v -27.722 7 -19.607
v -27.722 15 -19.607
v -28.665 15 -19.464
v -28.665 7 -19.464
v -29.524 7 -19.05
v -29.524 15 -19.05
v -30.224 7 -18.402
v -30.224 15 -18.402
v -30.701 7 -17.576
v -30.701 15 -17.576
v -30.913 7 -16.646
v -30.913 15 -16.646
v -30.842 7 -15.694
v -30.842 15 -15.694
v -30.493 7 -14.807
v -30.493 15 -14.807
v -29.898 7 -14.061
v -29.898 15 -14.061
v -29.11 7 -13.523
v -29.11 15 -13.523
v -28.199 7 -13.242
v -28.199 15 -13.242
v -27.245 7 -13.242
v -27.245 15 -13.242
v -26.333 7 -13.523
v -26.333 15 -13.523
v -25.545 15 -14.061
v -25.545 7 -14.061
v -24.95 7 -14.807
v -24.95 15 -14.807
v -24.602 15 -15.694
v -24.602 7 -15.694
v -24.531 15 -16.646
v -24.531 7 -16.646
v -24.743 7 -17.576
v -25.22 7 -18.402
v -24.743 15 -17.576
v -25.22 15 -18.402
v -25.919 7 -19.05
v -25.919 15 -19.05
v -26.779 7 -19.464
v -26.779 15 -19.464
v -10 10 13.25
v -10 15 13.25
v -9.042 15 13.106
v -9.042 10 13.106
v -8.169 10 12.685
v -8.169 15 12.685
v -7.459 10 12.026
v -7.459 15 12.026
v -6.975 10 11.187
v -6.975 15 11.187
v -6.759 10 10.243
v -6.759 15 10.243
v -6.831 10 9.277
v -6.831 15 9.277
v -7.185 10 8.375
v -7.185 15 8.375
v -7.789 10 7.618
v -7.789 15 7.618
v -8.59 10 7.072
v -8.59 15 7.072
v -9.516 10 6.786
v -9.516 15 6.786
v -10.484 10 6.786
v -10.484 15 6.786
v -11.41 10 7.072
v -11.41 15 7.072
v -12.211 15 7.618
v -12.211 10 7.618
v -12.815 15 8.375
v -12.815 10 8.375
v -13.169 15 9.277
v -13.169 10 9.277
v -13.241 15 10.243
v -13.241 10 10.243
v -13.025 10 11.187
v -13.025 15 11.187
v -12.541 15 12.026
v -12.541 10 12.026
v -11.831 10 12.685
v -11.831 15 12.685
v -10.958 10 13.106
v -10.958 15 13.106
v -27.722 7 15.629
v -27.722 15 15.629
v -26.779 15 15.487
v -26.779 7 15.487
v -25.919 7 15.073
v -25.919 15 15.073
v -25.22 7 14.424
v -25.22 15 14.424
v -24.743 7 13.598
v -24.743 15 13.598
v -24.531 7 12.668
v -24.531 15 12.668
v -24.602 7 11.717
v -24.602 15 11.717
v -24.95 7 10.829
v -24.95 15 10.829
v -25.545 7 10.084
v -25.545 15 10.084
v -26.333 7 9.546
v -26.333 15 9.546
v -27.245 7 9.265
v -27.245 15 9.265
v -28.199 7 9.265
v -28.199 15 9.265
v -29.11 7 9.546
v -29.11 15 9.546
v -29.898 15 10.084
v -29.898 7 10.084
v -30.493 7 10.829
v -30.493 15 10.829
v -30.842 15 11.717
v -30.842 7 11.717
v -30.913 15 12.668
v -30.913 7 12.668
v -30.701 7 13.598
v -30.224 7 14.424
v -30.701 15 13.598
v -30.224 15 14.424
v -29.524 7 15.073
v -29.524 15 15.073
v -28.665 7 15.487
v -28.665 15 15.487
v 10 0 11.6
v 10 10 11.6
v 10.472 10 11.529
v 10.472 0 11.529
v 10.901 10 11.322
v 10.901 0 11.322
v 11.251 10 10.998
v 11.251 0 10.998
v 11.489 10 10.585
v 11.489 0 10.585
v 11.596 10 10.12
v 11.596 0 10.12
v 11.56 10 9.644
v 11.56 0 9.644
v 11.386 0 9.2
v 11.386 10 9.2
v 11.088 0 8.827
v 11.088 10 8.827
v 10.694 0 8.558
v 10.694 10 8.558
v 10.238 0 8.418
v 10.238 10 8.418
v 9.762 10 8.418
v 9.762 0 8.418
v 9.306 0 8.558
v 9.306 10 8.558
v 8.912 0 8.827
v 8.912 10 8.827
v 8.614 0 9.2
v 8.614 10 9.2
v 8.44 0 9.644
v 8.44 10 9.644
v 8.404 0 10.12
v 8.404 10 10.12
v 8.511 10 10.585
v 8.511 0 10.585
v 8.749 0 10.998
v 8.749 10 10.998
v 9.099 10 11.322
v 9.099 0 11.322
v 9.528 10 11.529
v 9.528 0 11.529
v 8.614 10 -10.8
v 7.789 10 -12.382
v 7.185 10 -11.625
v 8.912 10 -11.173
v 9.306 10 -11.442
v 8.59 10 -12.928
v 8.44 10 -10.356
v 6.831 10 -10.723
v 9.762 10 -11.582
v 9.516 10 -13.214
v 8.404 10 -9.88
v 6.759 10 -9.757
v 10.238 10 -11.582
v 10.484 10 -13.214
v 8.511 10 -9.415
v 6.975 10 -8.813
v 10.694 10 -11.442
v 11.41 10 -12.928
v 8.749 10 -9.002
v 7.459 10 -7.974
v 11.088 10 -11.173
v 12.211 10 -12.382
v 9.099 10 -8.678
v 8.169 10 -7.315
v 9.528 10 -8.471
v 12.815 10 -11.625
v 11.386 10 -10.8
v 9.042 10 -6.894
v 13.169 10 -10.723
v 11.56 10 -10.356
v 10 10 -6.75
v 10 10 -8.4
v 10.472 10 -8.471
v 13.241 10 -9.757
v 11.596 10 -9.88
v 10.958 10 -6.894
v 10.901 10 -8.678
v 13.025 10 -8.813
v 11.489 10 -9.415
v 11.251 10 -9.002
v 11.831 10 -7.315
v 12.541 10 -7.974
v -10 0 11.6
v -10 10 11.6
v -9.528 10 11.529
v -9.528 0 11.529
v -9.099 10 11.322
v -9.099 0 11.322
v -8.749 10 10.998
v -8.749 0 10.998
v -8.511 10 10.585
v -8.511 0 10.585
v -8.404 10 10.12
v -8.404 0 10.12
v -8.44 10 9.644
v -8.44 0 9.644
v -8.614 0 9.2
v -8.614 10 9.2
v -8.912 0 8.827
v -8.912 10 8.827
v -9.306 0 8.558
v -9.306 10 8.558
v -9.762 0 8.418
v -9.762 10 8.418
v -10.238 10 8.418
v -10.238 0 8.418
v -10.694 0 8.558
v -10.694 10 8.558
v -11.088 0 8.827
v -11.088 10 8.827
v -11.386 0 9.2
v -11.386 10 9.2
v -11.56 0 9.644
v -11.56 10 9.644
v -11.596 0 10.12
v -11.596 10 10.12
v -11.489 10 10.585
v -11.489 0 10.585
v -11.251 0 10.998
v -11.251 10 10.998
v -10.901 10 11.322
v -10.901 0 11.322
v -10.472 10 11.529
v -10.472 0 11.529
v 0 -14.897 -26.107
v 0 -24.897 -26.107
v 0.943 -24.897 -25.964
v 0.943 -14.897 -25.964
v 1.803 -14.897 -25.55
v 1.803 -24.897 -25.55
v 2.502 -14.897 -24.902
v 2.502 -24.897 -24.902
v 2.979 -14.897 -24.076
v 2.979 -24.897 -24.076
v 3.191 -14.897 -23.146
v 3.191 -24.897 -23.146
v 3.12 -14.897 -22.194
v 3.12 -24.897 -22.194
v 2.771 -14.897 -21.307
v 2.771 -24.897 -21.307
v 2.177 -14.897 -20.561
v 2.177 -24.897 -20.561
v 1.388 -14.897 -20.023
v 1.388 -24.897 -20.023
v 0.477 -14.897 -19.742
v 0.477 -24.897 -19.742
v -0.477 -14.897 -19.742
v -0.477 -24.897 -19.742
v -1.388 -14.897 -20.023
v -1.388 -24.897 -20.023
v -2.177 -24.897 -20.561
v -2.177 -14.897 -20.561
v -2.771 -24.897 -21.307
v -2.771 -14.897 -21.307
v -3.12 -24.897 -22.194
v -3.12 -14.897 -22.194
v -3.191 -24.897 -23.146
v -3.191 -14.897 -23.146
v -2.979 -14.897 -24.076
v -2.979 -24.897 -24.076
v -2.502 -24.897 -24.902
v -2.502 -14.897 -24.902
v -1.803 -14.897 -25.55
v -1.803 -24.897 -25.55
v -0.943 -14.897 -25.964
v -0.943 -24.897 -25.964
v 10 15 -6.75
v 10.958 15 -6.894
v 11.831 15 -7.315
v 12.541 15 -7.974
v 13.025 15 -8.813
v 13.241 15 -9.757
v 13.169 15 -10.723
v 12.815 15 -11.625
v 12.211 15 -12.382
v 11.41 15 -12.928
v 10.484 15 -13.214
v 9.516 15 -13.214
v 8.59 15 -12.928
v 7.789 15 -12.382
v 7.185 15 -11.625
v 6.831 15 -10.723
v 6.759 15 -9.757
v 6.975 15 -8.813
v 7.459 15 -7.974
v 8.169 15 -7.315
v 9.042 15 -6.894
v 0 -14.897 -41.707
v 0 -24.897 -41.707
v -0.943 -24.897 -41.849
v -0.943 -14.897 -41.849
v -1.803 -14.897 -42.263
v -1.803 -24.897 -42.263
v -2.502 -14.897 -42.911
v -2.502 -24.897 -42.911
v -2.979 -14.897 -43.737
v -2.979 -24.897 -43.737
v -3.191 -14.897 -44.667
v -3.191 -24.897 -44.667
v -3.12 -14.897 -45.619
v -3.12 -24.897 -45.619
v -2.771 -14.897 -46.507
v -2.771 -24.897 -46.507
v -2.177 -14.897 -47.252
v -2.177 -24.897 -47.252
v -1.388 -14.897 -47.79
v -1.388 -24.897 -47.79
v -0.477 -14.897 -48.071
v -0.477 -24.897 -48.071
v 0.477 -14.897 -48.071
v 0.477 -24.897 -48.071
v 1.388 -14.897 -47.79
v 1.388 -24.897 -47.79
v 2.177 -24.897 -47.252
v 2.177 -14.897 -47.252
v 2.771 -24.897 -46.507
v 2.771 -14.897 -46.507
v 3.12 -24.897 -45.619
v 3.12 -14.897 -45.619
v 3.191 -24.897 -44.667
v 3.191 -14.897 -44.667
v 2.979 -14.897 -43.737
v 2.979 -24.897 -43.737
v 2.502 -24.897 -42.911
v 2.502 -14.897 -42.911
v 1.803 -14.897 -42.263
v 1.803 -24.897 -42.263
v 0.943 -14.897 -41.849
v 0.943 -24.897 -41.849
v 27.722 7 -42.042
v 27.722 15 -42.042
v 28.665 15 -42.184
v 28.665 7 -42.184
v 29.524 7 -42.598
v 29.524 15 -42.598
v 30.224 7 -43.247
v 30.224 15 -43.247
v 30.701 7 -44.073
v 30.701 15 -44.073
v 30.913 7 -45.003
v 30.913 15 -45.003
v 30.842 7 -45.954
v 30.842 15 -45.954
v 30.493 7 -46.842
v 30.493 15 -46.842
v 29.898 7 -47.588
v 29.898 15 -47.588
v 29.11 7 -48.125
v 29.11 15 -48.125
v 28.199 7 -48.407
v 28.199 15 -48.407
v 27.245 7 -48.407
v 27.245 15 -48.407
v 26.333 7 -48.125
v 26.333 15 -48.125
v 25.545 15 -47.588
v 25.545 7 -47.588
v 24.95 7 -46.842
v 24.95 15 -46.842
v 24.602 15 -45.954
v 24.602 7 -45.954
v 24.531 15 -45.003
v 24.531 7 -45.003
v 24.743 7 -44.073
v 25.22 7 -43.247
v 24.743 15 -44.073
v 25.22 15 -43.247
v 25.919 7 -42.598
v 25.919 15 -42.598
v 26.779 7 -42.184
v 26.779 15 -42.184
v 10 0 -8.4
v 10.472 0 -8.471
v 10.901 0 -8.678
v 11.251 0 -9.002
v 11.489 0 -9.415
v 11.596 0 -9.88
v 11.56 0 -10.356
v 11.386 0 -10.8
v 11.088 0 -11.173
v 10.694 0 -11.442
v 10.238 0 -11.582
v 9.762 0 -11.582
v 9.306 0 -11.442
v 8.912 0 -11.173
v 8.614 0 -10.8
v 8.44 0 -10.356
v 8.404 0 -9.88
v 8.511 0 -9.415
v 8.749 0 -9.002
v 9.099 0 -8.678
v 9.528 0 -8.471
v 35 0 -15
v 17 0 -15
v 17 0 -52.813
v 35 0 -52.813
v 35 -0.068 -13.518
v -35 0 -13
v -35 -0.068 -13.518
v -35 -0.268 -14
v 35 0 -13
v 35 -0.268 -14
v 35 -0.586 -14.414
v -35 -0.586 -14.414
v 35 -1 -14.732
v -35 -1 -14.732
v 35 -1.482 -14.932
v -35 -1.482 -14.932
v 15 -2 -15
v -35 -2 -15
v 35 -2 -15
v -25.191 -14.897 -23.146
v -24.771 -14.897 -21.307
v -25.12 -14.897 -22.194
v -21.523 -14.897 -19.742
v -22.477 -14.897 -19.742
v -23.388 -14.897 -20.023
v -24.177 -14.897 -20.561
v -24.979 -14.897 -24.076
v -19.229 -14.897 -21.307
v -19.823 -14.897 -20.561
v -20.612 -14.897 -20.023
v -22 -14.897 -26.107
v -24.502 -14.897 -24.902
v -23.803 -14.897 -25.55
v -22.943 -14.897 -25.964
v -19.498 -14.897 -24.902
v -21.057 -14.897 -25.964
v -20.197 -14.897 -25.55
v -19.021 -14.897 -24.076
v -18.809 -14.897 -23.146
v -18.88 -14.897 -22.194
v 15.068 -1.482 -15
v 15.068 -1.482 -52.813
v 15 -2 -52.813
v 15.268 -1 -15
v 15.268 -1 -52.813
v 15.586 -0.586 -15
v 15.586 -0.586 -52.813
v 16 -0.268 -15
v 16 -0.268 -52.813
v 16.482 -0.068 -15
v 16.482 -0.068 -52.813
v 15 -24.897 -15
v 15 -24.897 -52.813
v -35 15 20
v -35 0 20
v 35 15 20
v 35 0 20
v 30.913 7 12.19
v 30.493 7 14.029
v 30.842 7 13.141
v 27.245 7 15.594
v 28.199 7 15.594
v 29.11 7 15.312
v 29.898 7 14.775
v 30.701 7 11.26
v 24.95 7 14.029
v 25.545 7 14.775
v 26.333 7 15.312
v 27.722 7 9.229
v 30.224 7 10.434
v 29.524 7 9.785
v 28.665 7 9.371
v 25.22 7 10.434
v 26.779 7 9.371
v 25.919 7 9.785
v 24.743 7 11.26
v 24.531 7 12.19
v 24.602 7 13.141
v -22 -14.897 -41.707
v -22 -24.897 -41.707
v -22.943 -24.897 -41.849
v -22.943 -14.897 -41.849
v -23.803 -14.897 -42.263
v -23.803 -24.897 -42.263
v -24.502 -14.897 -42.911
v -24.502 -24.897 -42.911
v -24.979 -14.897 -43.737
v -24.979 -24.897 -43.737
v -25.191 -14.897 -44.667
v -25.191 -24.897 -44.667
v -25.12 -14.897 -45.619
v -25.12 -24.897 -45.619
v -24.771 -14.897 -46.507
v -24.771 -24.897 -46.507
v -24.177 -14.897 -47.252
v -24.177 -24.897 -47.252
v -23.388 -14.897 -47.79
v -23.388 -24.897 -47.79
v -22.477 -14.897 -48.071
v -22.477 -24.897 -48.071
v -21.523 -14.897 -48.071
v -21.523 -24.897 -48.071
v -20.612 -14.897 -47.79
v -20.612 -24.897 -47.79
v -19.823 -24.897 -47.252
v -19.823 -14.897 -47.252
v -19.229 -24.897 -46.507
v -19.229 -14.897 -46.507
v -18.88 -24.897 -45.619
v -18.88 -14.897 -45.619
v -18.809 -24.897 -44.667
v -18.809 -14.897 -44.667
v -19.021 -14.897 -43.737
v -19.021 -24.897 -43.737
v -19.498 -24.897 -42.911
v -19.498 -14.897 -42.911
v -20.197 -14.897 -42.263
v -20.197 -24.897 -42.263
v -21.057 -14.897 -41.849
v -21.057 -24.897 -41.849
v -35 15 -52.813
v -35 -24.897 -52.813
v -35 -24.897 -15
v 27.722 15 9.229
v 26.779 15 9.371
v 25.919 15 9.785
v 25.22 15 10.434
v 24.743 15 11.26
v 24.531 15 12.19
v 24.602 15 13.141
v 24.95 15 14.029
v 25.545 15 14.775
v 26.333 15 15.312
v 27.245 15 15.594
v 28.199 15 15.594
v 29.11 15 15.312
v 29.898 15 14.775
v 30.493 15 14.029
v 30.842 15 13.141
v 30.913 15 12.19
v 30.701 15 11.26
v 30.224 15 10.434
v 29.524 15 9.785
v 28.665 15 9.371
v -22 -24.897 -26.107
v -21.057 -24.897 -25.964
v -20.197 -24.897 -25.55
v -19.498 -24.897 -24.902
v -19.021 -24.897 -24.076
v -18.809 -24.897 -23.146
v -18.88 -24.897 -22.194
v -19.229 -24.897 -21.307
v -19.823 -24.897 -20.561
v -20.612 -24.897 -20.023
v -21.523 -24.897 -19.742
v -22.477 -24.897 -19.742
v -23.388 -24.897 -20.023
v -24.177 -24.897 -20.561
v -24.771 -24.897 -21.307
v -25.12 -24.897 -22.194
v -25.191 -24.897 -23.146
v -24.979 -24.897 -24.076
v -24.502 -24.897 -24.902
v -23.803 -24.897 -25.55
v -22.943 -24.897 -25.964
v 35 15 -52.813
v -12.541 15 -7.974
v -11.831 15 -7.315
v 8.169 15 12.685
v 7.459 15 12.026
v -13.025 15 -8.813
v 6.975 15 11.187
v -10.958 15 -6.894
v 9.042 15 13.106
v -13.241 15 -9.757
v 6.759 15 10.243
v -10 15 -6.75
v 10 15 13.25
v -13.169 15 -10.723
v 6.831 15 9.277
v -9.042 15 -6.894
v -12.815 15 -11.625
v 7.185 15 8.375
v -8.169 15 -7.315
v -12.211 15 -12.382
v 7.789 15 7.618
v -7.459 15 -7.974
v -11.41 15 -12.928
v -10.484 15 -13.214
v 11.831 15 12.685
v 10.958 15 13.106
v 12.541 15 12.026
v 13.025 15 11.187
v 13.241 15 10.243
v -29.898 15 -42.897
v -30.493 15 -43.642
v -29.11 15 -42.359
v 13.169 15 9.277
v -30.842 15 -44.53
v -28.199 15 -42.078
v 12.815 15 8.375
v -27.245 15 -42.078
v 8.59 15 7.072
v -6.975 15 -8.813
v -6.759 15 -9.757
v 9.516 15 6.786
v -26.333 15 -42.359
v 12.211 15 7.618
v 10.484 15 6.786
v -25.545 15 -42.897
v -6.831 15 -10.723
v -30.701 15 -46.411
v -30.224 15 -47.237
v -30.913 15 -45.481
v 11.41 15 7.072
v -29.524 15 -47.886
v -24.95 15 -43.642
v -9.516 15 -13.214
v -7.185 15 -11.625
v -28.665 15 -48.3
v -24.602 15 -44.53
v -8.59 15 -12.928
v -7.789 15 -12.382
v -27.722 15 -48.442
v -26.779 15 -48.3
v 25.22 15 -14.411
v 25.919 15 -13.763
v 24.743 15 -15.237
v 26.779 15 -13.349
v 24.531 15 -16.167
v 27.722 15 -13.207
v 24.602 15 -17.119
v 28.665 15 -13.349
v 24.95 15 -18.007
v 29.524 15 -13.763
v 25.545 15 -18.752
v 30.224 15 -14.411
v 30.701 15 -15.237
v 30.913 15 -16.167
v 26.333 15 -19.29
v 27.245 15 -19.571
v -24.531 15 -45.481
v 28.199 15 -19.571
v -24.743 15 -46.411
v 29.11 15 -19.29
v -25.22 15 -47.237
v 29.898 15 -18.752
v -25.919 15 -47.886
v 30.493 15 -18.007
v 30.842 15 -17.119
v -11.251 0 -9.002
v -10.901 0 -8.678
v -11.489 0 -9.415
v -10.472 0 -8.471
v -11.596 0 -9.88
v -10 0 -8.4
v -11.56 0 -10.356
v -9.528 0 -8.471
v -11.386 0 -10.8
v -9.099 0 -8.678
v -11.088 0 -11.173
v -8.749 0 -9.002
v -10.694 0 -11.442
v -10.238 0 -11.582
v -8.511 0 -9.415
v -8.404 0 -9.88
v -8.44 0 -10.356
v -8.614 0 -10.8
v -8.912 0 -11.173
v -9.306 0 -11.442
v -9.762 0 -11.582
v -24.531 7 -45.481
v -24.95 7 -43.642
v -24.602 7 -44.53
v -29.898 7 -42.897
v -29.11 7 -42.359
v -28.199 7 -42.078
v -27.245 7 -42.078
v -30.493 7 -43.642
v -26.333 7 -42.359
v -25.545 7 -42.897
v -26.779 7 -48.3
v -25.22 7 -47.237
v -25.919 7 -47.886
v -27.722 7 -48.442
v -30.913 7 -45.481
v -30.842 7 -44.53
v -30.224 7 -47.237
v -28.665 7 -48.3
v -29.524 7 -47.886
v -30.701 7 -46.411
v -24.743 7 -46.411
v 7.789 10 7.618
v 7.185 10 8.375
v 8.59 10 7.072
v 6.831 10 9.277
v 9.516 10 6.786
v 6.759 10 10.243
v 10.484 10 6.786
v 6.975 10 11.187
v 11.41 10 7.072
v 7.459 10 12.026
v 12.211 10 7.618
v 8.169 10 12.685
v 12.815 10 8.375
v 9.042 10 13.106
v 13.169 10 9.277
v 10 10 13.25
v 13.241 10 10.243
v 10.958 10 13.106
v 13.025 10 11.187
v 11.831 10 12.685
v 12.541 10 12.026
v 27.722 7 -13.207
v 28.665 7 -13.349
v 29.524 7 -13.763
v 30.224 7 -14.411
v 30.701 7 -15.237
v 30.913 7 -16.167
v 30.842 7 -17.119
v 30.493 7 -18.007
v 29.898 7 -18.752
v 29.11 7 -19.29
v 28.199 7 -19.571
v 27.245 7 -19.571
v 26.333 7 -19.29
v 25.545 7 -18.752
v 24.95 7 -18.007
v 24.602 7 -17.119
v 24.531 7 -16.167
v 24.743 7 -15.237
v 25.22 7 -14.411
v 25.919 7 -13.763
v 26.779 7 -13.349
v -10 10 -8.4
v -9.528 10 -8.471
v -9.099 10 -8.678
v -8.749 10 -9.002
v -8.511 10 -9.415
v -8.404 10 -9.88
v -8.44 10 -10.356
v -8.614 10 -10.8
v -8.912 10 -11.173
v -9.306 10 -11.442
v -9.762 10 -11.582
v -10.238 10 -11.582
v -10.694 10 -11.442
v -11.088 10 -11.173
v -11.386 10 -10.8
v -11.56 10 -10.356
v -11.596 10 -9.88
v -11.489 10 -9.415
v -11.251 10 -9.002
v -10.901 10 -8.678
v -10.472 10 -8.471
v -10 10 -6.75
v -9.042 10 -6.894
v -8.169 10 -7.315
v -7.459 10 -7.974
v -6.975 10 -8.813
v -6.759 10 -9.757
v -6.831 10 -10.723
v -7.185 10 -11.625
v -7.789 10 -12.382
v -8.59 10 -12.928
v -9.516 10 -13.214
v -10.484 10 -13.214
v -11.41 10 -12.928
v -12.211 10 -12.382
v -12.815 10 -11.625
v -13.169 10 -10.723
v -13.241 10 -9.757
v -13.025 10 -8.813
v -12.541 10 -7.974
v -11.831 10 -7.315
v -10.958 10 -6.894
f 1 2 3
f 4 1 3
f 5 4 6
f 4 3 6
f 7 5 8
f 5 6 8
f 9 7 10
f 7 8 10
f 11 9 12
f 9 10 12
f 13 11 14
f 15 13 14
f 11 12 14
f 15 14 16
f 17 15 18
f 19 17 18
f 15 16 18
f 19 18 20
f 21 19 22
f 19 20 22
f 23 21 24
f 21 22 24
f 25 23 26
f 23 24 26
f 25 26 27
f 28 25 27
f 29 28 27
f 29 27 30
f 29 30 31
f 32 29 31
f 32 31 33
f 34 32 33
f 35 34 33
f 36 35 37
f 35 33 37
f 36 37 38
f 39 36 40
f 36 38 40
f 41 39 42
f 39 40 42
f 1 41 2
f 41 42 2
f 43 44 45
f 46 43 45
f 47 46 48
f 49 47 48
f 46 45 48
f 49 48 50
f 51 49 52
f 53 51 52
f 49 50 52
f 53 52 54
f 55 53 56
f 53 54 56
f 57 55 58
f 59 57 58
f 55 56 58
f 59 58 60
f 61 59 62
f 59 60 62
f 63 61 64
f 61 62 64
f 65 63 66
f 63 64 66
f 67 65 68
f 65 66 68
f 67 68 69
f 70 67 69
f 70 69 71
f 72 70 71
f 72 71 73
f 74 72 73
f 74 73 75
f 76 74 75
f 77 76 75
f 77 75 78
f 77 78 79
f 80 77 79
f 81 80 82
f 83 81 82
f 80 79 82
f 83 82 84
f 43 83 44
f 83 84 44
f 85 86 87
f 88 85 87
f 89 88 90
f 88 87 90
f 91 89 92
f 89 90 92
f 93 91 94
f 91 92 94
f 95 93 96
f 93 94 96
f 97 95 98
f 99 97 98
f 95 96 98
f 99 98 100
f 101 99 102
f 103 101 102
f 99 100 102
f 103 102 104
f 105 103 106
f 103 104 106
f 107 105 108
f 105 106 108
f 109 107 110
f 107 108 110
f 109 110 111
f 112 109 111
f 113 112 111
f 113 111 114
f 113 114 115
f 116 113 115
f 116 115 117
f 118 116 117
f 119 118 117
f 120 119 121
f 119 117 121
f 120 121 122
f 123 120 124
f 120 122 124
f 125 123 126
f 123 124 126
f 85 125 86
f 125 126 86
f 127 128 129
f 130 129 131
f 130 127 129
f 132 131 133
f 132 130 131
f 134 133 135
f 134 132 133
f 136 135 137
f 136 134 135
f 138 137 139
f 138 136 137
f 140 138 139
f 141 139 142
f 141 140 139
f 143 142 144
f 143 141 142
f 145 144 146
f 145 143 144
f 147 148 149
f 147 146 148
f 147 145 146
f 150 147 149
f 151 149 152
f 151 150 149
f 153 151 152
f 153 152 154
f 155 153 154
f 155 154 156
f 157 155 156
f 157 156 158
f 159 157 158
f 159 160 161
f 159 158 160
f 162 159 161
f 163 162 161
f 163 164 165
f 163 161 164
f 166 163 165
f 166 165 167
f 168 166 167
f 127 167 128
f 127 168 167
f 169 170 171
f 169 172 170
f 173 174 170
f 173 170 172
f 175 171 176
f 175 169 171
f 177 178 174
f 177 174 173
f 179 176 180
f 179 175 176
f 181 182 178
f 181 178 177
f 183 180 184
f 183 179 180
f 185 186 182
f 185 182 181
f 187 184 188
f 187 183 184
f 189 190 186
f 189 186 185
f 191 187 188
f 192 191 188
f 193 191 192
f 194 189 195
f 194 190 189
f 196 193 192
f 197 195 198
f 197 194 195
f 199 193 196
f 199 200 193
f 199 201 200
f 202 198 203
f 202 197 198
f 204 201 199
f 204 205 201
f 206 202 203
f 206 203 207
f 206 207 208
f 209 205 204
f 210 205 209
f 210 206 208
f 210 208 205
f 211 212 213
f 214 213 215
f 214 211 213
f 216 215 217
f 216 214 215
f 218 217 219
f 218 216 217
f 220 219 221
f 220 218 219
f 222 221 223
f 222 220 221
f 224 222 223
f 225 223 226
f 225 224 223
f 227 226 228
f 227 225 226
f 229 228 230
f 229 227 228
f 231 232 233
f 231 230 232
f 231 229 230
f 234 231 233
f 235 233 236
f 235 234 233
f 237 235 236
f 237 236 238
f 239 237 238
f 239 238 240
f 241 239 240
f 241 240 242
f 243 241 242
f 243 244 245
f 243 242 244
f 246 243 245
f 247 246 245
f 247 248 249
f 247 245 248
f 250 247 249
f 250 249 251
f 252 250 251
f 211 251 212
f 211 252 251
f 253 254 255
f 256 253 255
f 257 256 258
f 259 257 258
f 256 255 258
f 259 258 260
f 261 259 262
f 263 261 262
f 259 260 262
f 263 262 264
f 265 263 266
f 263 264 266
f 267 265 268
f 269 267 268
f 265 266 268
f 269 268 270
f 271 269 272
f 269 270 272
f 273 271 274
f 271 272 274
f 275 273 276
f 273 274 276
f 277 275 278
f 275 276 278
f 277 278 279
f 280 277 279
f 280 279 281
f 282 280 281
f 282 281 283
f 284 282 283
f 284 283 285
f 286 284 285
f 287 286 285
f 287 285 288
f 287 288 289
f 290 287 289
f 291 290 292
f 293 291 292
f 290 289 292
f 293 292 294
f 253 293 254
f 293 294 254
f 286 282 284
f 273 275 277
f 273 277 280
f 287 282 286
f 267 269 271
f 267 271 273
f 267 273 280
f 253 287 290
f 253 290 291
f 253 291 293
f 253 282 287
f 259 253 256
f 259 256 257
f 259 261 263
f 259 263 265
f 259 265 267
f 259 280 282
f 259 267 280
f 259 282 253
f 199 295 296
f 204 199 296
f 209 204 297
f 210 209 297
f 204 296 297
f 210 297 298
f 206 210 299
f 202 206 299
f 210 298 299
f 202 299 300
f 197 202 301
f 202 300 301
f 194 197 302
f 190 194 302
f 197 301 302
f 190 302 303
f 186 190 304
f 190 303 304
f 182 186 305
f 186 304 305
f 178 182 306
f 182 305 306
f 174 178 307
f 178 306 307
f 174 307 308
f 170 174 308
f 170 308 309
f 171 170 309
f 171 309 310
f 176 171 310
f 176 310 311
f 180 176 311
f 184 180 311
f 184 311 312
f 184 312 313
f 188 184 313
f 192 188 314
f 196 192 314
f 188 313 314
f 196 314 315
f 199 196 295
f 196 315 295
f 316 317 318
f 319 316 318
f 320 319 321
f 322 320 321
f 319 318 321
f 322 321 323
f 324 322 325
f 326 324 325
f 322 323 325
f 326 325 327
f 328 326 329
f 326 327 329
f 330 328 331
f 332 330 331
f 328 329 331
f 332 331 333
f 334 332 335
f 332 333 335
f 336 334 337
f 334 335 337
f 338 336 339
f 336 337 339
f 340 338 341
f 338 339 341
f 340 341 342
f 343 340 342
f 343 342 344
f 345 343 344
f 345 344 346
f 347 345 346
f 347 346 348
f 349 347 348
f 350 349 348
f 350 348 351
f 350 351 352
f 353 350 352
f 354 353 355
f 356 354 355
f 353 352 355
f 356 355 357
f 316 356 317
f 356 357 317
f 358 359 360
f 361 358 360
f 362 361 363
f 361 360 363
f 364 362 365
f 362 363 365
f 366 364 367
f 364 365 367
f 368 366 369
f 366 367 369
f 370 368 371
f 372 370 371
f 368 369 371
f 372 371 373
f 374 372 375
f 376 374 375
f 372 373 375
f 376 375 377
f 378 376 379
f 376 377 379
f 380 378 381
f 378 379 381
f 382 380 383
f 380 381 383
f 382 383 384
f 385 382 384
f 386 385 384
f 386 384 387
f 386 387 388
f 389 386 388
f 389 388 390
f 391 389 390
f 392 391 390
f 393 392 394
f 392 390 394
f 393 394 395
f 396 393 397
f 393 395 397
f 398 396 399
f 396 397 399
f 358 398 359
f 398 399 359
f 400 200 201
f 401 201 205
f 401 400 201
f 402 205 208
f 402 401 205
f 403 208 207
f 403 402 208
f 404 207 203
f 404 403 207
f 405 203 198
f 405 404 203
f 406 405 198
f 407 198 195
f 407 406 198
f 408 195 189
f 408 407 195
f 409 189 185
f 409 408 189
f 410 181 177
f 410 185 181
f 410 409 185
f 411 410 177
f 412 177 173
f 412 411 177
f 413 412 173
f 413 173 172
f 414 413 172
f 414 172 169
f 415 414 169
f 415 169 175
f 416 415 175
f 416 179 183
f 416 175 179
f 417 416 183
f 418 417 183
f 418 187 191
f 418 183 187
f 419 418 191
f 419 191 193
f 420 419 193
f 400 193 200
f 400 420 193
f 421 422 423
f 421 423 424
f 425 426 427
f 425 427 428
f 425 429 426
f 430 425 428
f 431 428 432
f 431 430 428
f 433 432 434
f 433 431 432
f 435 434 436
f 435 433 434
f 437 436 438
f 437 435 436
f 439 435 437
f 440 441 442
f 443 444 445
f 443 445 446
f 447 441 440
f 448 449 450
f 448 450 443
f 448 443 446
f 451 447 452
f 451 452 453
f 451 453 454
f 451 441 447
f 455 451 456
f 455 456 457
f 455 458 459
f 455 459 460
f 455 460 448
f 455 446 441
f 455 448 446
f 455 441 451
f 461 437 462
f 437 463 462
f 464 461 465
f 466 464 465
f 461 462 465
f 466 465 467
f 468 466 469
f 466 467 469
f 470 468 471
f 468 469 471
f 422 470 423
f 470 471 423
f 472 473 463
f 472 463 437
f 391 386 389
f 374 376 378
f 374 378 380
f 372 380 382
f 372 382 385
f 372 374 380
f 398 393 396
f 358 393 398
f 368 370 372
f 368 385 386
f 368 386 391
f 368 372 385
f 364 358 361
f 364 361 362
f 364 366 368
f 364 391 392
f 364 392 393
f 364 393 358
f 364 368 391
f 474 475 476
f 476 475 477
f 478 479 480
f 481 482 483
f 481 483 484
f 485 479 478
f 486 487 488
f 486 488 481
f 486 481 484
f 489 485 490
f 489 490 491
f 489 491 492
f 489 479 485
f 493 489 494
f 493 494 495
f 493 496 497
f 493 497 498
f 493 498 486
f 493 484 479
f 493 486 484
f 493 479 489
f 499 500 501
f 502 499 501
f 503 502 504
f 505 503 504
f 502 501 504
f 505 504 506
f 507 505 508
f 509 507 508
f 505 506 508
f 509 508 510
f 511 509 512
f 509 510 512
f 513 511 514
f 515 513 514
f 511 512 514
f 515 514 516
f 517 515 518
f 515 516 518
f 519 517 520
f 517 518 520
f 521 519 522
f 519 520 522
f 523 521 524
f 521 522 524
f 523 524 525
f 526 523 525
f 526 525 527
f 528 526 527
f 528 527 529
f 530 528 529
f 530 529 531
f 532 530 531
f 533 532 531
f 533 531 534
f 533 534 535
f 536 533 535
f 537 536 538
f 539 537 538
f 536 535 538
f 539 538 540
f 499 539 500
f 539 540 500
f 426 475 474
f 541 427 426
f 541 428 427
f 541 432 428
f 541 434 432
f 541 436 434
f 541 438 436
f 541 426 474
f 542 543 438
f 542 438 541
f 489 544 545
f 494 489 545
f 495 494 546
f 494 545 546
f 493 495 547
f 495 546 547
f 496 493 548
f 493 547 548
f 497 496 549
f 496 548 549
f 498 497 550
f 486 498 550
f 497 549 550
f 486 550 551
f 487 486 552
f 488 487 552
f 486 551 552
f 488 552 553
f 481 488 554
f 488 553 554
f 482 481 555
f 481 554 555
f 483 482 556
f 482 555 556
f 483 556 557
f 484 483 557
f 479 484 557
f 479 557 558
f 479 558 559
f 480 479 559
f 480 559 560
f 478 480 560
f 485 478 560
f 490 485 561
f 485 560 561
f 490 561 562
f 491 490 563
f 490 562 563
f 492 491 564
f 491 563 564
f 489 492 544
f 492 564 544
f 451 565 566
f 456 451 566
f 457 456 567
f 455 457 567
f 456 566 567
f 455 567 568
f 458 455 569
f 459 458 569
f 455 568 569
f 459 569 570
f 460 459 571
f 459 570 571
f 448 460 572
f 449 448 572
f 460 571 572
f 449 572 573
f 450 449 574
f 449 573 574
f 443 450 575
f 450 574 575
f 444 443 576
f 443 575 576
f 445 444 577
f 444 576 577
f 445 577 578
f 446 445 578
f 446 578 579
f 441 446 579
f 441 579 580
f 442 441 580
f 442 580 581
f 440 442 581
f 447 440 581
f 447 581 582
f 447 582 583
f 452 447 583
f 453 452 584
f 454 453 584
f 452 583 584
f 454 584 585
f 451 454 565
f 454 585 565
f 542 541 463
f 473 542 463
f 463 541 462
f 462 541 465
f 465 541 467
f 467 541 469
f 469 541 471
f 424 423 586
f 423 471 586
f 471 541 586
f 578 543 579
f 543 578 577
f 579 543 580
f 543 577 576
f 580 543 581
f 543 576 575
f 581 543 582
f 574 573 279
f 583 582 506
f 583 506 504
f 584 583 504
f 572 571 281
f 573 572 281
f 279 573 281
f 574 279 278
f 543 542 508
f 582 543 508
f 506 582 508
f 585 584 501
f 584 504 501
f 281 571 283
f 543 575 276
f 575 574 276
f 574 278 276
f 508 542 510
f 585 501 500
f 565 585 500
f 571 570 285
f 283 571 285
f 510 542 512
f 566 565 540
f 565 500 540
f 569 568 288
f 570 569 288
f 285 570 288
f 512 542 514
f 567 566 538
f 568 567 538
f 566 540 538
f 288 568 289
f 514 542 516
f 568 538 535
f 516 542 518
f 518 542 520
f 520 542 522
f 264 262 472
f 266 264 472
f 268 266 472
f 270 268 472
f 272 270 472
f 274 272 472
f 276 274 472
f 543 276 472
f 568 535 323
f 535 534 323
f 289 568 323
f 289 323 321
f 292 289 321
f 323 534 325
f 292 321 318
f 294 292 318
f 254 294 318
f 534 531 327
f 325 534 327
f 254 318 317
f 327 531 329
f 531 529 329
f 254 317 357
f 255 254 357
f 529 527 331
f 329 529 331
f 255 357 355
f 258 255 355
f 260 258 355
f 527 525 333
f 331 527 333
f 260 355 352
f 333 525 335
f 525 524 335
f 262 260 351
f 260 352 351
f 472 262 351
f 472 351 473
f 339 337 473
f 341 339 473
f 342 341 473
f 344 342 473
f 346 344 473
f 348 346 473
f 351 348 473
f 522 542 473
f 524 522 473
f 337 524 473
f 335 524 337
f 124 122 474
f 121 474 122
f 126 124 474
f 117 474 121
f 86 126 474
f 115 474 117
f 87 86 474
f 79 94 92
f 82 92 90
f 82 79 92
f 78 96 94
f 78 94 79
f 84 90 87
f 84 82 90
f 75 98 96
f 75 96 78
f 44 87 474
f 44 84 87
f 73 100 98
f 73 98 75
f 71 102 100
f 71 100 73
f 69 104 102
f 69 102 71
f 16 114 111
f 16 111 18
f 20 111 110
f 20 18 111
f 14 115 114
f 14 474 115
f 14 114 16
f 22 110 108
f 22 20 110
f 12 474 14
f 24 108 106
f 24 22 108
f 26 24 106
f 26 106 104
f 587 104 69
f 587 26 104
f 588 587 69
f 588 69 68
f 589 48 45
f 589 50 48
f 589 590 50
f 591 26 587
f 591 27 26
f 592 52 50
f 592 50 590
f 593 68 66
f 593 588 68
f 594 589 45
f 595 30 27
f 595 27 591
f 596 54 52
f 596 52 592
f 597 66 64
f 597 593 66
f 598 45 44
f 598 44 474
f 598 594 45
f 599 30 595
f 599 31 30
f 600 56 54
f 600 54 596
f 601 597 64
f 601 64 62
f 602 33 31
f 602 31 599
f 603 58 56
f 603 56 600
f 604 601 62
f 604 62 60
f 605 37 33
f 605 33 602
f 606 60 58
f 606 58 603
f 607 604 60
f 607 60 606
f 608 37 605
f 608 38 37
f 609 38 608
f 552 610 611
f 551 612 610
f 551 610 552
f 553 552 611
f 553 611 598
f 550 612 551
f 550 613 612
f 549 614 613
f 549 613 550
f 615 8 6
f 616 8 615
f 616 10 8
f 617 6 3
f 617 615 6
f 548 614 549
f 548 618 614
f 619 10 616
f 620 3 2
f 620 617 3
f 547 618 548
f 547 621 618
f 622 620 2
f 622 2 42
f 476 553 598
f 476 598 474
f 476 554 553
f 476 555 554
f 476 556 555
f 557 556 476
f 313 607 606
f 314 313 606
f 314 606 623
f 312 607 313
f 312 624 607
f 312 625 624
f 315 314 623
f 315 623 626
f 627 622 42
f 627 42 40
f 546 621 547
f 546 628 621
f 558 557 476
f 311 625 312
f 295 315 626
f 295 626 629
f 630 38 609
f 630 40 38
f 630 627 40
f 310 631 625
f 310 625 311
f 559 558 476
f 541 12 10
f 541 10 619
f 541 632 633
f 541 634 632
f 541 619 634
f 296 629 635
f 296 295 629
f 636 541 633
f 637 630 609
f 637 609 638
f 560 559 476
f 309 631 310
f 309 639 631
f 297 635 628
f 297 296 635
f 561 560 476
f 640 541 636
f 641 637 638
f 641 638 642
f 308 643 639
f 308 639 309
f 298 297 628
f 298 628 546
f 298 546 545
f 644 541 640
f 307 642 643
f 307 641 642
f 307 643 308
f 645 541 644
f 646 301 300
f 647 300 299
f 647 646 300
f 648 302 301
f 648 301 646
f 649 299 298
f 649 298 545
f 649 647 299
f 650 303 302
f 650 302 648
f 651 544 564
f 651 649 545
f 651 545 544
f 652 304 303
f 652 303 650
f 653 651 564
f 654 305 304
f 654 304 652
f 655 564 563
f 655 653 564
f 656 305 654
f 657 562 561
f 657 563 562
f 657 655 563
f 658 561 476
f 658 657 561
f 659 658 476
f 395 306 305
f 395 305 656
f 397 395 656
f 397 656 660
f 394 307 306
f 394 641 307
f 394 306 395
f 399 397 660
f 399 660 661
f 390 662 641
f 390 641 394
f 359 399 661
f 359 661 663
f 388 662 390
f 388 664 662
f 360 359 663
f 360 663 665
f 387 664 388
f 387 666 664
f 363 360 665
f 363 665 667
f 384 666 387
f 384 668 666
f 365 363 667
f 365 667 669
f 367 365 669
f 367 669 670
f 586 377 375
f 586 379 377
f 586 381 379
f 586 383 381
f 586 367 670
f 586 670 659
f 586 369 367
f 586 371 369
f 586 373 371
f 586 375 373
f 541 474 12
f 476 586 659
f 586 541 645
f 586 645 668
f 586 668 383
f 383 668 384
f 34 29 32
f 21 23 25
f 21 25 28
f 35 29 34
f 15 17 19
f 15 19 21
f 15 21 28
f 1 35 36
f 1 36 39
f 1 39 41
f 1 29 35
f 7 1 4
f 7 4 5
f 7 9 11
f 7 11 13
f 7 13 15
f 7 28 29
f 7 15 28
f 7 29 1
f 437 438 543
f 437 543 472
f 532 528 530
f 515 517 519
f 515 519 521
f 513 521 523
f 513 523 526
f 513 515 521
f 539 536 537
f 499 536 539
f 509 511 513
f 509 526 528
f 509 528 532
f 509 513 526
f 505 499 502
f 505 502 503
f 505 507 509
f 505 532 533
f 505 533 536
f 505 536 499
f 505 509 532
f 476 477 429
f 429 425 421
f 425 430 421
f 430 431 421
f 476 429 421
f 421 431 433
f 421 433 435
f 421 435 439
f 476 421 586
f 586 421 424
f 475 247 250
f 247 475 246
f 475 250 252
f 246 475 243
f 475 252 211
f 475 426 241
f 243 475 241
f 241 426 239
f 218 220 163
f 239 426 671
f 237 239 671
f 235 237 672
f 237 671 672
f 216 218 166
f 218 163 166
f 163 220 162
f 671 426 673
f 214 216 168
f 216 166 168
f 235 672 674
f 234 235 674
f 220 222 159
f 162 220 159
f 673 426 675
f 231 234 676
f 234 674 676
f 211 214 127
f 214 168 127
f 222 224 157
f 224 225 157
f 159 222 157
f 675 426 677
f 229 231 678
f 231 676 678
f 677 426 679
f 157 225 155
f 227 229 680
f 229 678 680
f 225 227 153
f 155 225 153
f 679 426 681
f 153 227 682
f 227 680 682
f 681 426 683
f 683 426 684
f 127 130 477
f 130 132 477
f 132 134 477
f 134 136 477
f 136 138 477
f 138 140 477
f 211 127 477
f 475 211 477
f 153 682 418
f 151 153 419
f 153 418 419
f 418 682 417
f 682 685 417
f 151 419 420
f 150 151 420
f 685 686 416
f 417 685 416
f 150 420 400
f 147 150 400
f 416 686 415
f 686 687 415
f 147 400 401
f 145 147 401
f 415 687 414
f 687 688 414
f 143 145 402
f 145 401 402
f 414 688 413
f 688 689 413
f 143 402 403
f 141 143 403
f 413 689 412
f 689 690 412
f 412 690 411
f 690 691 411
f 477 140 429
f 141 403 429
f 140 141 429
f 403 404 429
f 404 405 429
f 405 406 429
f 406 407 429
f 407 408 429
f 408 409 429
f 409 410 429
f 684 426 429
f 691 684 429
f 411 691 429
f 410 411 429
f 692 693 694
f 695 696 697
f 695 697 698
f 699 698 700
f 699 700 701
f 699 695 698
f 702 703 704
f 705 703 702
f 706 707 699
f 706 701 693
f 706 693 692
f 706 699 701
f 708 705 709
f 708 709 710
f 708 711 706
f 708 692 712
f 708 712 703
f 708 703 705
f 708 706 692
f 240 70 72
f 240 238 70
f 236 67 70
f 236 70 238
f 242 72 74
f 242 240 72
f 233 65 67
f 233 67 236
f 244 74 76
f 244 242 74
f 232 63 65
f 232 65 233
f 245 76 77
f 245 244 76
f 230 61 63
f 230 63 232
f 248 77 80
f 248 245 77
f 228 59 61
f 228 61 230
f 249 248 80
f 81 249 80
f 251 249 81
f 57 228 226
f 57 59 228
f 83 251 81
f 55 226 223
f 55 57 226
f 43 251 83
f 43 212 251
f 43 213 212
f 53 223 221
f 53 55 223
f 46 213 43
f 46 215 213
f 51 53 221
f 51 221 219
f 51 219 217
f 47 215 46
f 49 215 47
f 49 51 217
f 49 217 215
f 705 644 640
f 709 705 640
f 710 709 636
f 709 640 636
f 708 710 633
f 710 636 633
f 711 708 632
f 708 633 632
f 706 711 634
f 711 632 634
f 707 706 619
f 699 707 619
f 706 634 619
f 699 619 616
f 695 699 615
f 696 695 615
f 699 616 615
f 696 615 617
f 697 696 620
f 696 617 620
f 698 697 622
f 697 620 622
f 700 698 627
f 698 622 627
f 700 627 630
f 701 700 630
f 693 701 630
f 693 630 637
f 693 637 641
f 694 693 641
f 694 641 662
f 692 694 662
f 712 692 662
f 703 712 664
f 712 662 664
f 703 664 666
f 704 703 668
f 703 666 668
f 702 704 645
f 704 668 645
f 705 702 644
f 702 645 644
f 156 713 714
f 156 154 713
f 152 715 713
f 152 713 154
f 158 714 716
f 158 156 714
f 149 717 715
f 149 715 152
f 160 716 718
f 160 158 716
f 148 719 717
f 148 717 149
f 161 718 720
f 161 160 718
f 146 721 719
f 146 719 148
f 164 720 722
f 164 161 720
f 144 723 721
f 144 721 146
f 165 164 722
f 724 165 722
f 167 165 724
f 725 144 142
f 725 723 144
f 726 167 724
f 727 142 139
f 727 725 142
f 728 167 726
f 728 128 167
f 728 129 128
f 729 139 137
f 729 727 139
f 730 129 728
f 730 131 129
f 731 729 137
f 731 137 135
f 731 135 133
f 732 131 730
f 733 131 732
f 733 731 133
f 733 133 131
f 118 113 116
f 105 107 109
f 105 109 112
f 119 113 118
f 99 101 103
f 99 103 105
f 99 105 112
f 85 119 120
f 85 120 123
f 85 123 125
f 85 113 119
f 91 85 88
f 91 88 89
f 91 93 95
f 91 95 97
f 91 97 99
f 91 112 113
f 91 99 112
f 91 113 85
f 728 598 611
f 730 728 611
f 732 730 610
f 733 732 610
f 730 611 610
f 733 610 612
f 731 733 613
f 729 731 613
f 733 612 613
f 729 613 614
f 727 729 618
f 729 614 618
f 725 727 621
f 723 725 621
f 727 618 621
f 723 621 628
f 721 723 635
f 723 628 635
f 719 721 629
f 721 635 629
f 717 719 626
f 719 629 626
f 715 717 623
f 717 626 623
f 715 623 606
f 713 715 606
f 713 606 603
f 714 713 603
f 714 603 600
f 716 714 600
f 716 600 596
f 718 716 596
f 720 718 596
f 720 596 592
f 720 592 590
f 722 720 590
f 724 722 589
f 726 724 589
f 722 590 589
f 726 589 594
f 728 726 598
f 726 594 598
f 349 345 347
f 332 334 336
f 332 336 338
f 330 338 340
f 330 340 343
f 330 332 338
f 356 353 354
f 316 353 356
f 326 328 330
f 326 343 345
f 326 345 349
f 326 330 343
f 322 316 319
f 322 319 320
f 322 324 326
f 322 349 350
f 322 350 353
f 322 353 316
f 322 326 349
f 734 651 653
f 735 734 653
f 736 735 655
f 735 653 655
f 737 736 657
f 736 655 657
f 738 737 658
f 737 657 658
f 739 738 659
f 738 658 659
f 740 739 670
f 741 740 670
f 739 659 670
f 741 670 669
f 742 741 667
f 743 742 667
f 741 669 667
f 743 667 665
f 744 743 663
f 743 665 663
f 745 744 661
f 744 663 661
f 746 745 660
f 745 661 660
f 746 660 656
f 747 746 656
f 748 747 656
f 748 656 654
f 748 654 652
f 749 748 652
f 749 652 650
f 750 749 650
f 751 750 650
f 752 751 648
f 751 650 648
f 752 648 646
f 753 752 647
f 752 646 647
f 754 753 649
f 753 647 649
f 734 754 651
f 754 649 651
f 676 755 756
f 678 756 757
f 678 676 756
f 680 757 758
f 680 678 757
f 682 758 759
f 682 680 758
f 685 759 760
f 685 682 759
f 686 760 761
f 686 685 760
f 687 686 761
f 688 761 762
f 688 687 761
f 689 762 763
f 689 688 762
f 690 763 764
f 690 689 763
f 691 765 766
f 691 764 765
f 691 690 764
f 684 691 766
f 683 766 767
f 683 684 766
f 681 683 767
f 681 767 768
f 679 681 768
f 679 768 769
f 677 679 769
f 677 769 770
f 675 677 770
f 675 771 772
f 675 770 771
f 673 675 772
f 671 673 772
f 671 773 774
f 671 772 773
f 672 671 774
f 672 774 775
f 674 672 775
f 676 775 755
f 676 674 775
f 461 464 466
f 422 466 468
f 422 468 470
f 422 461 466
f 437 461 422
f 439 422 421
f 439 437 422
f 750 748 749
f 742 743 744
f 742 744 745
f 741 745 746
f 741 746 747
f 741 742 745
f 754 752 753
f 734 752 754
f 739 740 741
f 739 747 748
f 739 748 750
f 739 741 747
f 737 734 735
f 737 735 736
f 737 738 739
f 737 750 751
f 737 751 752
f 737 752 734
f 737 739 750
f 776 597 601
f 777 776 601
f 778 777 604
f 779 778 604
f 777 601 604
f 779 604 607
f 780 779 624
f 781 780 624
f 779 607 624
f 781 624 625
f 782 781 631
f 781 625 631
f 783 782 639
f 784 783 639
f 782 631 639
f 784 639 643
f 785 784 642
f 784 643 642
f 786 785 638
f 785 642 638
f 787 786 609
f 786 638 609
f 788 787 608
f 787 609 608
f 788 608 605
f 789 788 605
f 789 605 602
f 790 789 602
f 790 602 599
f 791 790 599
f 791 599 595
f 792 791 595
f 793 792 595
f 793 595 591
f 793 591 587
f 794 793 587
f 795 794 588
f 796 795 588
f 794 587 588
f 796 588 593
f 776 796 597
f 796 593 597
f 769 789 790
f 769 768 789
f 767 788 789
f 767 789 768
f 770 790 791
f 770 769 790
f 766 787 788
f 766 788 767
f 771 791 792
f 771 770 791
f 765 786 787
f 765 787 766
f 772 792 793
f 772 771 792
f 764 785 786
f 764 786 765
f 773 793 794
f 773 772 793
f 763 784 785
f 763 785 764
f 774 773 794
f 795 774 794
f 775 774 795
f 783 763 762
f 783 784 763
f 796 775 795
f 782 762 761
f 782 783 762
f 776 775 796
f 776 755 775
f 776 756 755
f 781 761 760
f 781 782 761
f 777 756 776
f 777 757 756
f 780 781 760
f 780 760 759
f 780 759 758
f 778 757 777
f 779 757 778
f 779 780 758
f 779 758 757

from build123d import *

# Parameters (mm, degrees)
SKETCH1_W           = 70
SKETCH1_H           = 40
SKETCH1_R           = 1.6
BOSS_EXTRUDE1_DEPTH = 15
SKETCH2_R           = 3.25
CUT_EXTRUDE1_DEPTH  = 5
SKETCH3_W           = 70
SKETCH3_H           = 37.813008
BOSS_EXTRUDE2_DEPTH = 39.896897
FILLET1_R           = 2
SKETCH4_R           = 3.2
CUT_EXTRUDE2_DEPTH  = 8
SKETCH5_R           = 3.2
CUT_EXTRUDE3_DEPTH  = 10
CUT_EXTRUDE4_REACH  = 76.873
SKETCH7_W           = 20
SKETCH7_H           = 37.813008
FILLET2_R           = 2


with BuildPart() as part:
    # Sketch1 → Boss-Extrude1 (new body)
    with BuildSketch(Plane(origin=(0, 0, 0), x_dir=(1, 0, 0), z_dir=(0, 1, 0))):
        Rectangle(SKETCH1_W, SKETCH1_H)
        with Locations(Location((10, 10, 0), (0, 0, 270))):
            Circle(SKETCH1_R, mode=Mode.SUBTRACT)
        with Locations(Location((10, -10, 0), (0, 0, 270))):
            Circle(SKETCH1_R, mode=Mode.SUBTRACT)
        with Locations(Location((-10, -10, 0), (0, 0, 270))):
            Circle(SKETCH1_R, mode=Mode.SUBTRACT)
        with Locations(Location((-10, 10, 0), (0, 0, 270))):
            Circle(SKETCH1_R, mode=Mode.SUBTRACT)
    extrude(amount=BOSS_EXTRUDE1_DEPTH)

    # Sketch2 → Cut-Extrude1 (cut)
    with BuildSketch(Plane(origin=(0, 15, 0), x_dir=(1, 0, 0), z_dir=(0, 1, 0))):
        with Locations(Location((10, 10, 0), (0, 0, 270))):
            Circle(SKETCH2_R)
        with Locations(Location((10, -10, 0), (0, 0, 270))):
            Circle(SKETCH2_R)
        with Locations(Location((-10, -10, 0), (0, 0, 270))):
            Circle(SKETCH2_R)
        with Locations(Location((-10, 10, 0), (0, 0, 270))):
            Circle(SKETCH2_R)
    extrude(amount=-CUT_EXTRUDE1_DEPTH, mode=Mode.SUBTRACT)

    # Sketch3 → Boss-Extrude2 (add)
    with BuildSketch(Plane(origin=(0, 15, 0), x_dir=(1, 0, 0), z_dir=(0, 1, 0))):
        with Locations((0, 33.906504)):
            Rectangle(SKETCH3_W, SKETCH3_H)
    extrude(amount=-BOSS_EXTRUDE2_DEPTH)

    # Fillet1
    fillet1_edges = [part.edges().sort_by_distance(p)[0] for p in [
        (0, 0, -15),
    ]]
    fillet(fillet1_edges, radius=FILLET1_R)

    # Sketch4 → Cut-Extrude2 (cut)
    with BuildSketch(Plane(origin=(0, 15, 0), x_dir=(1, 0, 0), z_dir=(0, 1, 0))):
        with Locations(Location((27.721774771, 45.242301259, 0), (0, 0, 270))):
            Circle(SKETCH4_R)
        with Locations(Location((-27.721774771, 45.242301259, 0), (0, 0, 90))):
            Circle(SKETCH4_R)
        with Locations(Location((-27.721774771, -12.429293259, 0), (0, 0, 270))):
            Circle(SKETCH4_R)
        with Locations(Location((27.721774771, -12.429293259, 0), (0, 0, 90))):
            Circle(SKETCH4_R)
        with Locations(Location((27.721774771, 16.406504, 0), (0, 0, 270))):
            Circle(SKETCH4_R)
        with Locations(Location((-27.721774771, 16.406504, 0), (0, 0, 90))):
            Circle(SKETCH4_R)
    extrude(amount=-CUT_EXTRUDE2_DEPTH, mode=Mode.SUBTRACT)

    # Sketch5 → Cut-Extrude3 (cut)
    with BuildSketch(Plane.XZ.offset(24.896897)):
        with Locations(Location((0, -22.906504, 0), (0, 0, 270))):
            Circle(SKETCH5_R)
        with Locations(Location((0, -44.906504, 0), (0, 0, 90))):
            Circle(SKETCH5_R)
        with Locations(Location((-22, -22.906504, 0), (0, 0, 270))):
            Circle(SKETCH5_R)
        with Locations(Location((-22, -44.906504, 0), (0, 0, 90))):
            Circle(SKETCH5_R)
    extrude(amount=-CUT_EXTRUDE3_DEPTH, mode=Mode.SUBTRACT)

    # Cut-Extrude4: up to this face of the body (flat: up to its plane)
    cut_extrude4_end = Plane(part.part.faces().sort_by_distance((0, 0, 3.549430676))[0])
    # Sketch7 → Cut-Extrude4 (cut, up to the picked face)
    with BuildSketch(Plane.XZ.offset(24.896897), mode=Mode.PRIVATE) as cut_extrude4_sk1:
        with Locations((25, -33.906504)):
            Rectangle(SKETCH7_W, SKETCH7_H)
    cut_extrude4_tool1 = split(extrude(cut_extrude4_sk1.sketch, amount=-CUT_EXTRUDE4_REACH, mode=Mode.PRIVATE), bisect_by=cut_extrude4_end, keep=Keep.BOTH, mode=Mode.PRIVATE)
    add(cut_extrude4_tool1.solids().sort_by(Axis((25, -24.896897, -33.906504), (0, 1, 0)))[0], mode=Mode.SUBTRACT)

    # Fillet2
    fillet2_edges = [part.edges().sort_by_distance(p)[0] for p in [
        (15, 0, -33.906504),
    ]]
    fillet(fillet2_edges, radius=FILLET2_R)


solid = part.part
